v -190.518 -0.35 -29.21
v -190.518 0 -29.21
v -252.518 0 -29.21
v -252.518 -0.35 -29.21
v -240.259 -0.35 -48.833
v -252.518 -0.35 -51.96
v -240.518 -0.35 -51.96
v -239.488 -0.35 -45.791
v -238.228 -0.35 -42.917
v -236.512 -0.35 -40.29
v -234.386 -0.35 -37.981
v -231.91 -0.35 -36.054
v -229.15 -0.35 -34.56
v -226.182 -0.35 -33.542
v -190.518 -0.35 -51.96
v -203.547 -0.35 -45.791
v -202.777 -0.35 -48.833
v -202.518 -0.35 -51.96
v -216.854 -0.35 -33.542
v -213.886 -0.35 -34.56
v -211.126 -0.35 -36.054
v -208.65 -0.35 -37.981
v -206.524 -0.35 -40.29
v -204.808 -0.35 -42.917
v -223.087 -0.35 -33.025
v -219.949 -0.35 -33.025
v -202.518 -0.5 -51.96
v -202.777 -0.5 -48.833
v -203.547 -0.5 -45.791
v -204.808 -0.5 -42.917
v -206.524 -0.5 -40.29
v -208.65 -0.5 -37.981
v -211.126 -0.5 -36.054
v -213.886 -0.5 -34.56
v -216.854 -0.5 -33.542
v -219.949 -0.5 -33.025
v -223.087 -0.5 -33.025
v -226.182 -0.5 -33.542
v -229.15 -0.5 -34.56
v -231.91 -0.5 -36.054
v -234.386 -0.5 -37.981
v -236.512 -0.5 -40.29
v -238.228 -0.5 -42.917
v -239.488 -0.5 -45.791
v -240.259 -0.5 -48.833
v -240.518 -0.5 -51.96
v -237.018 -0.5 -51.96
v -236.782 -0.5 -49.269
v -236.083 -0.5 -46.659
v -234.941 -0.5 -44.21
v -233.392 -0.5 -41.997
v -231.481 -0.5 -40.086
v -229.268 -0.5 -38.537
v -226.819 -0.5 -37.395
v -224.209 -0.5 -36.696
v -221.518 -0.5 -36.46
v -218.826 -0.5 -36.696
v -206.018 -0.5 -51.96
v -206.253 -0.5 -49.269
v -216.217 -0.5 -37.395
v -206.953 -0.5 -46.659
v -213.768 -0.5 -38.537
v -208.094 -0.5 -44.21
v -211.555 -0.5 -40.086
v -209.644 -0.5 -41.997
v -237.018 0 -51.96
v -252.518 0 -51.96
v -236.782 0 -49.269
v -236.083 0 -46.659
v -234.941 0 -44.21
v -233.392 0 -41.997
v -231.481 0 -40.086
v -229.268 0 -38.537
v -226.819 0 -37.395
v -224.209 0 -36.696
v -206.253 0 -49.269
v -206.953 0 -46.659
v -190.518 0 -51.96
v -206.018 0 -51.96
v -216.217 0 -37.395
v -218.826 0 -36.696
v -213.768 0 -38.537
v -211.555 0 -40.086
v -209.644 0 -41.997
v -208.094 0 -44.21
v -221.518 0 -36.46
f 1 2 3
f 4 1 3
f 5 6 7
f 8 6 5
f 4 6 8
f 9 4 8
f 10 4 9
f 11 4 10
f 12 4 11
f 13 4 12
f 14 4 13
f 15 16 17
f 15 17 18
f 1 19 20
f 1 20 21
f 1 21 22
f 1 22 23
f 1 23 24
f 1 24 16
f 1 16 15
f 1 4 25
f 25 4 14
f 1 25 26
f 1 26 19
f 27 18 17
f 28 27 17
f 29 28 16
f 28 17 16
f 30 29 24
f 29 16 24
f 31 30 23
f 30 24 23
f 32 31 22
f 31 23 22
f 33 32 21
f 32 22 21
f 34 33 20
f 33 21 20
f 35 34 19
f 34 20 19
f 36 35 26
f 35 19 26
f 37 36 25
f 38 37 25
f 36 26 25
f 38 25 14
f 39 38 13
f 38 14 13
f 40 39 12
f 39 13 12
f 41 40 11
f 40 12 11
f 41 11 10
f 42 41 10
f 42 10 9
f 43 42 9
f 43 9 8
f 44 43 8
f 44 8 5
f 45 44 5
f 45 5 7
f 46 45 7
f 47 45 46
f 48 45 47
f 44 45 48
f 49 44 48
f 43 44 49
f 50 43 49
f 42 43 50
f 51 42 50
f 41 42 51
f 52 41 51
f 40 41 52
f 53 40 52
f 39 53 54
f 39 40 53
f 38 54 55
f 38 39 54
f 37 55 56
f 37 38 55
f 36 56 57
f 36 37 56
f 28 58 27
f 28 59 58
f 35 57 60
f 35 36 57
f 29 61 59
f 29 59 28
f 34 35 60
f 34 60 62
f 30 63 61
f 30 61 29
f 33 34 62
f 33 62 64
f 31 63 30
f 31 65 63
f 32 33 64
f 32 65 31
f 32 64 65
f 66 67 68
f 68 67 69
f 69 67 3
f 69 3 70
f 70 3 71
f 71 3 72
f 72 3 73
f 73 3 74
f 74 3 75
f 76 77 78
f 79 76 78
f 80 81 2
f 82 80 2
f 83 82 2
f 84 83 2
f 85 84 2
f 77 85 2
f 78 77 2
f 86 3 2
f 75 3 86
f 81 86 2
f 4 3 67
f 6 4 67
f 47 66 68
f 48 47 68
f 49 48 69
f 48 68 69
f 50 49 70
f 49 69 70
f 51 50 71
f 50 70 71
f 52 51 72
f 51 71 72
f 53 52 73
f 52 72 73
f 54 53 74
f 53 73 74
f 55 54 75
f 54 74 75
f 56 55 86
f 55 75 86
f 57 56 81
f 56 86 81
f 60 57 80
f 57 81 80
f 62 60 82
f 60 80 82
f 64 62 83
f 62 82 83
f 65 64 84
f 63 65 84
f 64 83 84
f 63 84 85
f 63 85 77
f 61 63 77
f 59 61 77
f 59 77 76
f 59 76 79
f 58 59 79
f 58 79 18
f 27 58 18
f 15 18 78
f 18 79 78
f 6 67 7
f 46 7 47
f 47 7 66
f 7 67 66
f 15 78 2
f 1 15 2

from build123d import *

# Parameters (mm, degrees)
F1_DEPTH = 0.35
F2_DEPTH = 0.5


with BuildPart() as f1:
    # F0 (on Front) → F1 (new body)
    with BuildSketch(Plane.XZ):
        with BuildLine():
            Line((-190.517892, -51.960177), (-190.517892, -29.210177))
            Line((-190.517892, -29.210177), (-252.517892, -29.210177))
            Line((-252.517892, -29.210177), (-252.517892, -51.960177))
            Line((-252.517892, -51.960177), (-240.517892, -51.960177))
            ThreePointArc((-240.517892, -51.960177), (-221.517892, -32.960177), (-202.517892, -51.960177))
            Line((-202.517892, -51.960177), (-190.517892, -51.960177))
        make_face()
    extrude(amount=F1_DEPTH)

    # F0 (on Front) → F2 (join)
    with BuildSketch(Plane.XZ):
        with BuildLine():
            Line((-206.017892, -51.960177), (-202.517892, -51.960177))
            ThreePointArc((-202.517892, -51.960177), (-221.517892, -32.960177), (-240.517892, -51.960177))
            Line((-240.517892, -51.960177), (-237.017892, -51.960177))
            ThreePointArc((-237.017892, -51.960177), (-221.517892, -36.460177), (-206.017892, -51.960177))
        make_face()
    extrude(amount=F2_DEPTH)


solid = f1.part
